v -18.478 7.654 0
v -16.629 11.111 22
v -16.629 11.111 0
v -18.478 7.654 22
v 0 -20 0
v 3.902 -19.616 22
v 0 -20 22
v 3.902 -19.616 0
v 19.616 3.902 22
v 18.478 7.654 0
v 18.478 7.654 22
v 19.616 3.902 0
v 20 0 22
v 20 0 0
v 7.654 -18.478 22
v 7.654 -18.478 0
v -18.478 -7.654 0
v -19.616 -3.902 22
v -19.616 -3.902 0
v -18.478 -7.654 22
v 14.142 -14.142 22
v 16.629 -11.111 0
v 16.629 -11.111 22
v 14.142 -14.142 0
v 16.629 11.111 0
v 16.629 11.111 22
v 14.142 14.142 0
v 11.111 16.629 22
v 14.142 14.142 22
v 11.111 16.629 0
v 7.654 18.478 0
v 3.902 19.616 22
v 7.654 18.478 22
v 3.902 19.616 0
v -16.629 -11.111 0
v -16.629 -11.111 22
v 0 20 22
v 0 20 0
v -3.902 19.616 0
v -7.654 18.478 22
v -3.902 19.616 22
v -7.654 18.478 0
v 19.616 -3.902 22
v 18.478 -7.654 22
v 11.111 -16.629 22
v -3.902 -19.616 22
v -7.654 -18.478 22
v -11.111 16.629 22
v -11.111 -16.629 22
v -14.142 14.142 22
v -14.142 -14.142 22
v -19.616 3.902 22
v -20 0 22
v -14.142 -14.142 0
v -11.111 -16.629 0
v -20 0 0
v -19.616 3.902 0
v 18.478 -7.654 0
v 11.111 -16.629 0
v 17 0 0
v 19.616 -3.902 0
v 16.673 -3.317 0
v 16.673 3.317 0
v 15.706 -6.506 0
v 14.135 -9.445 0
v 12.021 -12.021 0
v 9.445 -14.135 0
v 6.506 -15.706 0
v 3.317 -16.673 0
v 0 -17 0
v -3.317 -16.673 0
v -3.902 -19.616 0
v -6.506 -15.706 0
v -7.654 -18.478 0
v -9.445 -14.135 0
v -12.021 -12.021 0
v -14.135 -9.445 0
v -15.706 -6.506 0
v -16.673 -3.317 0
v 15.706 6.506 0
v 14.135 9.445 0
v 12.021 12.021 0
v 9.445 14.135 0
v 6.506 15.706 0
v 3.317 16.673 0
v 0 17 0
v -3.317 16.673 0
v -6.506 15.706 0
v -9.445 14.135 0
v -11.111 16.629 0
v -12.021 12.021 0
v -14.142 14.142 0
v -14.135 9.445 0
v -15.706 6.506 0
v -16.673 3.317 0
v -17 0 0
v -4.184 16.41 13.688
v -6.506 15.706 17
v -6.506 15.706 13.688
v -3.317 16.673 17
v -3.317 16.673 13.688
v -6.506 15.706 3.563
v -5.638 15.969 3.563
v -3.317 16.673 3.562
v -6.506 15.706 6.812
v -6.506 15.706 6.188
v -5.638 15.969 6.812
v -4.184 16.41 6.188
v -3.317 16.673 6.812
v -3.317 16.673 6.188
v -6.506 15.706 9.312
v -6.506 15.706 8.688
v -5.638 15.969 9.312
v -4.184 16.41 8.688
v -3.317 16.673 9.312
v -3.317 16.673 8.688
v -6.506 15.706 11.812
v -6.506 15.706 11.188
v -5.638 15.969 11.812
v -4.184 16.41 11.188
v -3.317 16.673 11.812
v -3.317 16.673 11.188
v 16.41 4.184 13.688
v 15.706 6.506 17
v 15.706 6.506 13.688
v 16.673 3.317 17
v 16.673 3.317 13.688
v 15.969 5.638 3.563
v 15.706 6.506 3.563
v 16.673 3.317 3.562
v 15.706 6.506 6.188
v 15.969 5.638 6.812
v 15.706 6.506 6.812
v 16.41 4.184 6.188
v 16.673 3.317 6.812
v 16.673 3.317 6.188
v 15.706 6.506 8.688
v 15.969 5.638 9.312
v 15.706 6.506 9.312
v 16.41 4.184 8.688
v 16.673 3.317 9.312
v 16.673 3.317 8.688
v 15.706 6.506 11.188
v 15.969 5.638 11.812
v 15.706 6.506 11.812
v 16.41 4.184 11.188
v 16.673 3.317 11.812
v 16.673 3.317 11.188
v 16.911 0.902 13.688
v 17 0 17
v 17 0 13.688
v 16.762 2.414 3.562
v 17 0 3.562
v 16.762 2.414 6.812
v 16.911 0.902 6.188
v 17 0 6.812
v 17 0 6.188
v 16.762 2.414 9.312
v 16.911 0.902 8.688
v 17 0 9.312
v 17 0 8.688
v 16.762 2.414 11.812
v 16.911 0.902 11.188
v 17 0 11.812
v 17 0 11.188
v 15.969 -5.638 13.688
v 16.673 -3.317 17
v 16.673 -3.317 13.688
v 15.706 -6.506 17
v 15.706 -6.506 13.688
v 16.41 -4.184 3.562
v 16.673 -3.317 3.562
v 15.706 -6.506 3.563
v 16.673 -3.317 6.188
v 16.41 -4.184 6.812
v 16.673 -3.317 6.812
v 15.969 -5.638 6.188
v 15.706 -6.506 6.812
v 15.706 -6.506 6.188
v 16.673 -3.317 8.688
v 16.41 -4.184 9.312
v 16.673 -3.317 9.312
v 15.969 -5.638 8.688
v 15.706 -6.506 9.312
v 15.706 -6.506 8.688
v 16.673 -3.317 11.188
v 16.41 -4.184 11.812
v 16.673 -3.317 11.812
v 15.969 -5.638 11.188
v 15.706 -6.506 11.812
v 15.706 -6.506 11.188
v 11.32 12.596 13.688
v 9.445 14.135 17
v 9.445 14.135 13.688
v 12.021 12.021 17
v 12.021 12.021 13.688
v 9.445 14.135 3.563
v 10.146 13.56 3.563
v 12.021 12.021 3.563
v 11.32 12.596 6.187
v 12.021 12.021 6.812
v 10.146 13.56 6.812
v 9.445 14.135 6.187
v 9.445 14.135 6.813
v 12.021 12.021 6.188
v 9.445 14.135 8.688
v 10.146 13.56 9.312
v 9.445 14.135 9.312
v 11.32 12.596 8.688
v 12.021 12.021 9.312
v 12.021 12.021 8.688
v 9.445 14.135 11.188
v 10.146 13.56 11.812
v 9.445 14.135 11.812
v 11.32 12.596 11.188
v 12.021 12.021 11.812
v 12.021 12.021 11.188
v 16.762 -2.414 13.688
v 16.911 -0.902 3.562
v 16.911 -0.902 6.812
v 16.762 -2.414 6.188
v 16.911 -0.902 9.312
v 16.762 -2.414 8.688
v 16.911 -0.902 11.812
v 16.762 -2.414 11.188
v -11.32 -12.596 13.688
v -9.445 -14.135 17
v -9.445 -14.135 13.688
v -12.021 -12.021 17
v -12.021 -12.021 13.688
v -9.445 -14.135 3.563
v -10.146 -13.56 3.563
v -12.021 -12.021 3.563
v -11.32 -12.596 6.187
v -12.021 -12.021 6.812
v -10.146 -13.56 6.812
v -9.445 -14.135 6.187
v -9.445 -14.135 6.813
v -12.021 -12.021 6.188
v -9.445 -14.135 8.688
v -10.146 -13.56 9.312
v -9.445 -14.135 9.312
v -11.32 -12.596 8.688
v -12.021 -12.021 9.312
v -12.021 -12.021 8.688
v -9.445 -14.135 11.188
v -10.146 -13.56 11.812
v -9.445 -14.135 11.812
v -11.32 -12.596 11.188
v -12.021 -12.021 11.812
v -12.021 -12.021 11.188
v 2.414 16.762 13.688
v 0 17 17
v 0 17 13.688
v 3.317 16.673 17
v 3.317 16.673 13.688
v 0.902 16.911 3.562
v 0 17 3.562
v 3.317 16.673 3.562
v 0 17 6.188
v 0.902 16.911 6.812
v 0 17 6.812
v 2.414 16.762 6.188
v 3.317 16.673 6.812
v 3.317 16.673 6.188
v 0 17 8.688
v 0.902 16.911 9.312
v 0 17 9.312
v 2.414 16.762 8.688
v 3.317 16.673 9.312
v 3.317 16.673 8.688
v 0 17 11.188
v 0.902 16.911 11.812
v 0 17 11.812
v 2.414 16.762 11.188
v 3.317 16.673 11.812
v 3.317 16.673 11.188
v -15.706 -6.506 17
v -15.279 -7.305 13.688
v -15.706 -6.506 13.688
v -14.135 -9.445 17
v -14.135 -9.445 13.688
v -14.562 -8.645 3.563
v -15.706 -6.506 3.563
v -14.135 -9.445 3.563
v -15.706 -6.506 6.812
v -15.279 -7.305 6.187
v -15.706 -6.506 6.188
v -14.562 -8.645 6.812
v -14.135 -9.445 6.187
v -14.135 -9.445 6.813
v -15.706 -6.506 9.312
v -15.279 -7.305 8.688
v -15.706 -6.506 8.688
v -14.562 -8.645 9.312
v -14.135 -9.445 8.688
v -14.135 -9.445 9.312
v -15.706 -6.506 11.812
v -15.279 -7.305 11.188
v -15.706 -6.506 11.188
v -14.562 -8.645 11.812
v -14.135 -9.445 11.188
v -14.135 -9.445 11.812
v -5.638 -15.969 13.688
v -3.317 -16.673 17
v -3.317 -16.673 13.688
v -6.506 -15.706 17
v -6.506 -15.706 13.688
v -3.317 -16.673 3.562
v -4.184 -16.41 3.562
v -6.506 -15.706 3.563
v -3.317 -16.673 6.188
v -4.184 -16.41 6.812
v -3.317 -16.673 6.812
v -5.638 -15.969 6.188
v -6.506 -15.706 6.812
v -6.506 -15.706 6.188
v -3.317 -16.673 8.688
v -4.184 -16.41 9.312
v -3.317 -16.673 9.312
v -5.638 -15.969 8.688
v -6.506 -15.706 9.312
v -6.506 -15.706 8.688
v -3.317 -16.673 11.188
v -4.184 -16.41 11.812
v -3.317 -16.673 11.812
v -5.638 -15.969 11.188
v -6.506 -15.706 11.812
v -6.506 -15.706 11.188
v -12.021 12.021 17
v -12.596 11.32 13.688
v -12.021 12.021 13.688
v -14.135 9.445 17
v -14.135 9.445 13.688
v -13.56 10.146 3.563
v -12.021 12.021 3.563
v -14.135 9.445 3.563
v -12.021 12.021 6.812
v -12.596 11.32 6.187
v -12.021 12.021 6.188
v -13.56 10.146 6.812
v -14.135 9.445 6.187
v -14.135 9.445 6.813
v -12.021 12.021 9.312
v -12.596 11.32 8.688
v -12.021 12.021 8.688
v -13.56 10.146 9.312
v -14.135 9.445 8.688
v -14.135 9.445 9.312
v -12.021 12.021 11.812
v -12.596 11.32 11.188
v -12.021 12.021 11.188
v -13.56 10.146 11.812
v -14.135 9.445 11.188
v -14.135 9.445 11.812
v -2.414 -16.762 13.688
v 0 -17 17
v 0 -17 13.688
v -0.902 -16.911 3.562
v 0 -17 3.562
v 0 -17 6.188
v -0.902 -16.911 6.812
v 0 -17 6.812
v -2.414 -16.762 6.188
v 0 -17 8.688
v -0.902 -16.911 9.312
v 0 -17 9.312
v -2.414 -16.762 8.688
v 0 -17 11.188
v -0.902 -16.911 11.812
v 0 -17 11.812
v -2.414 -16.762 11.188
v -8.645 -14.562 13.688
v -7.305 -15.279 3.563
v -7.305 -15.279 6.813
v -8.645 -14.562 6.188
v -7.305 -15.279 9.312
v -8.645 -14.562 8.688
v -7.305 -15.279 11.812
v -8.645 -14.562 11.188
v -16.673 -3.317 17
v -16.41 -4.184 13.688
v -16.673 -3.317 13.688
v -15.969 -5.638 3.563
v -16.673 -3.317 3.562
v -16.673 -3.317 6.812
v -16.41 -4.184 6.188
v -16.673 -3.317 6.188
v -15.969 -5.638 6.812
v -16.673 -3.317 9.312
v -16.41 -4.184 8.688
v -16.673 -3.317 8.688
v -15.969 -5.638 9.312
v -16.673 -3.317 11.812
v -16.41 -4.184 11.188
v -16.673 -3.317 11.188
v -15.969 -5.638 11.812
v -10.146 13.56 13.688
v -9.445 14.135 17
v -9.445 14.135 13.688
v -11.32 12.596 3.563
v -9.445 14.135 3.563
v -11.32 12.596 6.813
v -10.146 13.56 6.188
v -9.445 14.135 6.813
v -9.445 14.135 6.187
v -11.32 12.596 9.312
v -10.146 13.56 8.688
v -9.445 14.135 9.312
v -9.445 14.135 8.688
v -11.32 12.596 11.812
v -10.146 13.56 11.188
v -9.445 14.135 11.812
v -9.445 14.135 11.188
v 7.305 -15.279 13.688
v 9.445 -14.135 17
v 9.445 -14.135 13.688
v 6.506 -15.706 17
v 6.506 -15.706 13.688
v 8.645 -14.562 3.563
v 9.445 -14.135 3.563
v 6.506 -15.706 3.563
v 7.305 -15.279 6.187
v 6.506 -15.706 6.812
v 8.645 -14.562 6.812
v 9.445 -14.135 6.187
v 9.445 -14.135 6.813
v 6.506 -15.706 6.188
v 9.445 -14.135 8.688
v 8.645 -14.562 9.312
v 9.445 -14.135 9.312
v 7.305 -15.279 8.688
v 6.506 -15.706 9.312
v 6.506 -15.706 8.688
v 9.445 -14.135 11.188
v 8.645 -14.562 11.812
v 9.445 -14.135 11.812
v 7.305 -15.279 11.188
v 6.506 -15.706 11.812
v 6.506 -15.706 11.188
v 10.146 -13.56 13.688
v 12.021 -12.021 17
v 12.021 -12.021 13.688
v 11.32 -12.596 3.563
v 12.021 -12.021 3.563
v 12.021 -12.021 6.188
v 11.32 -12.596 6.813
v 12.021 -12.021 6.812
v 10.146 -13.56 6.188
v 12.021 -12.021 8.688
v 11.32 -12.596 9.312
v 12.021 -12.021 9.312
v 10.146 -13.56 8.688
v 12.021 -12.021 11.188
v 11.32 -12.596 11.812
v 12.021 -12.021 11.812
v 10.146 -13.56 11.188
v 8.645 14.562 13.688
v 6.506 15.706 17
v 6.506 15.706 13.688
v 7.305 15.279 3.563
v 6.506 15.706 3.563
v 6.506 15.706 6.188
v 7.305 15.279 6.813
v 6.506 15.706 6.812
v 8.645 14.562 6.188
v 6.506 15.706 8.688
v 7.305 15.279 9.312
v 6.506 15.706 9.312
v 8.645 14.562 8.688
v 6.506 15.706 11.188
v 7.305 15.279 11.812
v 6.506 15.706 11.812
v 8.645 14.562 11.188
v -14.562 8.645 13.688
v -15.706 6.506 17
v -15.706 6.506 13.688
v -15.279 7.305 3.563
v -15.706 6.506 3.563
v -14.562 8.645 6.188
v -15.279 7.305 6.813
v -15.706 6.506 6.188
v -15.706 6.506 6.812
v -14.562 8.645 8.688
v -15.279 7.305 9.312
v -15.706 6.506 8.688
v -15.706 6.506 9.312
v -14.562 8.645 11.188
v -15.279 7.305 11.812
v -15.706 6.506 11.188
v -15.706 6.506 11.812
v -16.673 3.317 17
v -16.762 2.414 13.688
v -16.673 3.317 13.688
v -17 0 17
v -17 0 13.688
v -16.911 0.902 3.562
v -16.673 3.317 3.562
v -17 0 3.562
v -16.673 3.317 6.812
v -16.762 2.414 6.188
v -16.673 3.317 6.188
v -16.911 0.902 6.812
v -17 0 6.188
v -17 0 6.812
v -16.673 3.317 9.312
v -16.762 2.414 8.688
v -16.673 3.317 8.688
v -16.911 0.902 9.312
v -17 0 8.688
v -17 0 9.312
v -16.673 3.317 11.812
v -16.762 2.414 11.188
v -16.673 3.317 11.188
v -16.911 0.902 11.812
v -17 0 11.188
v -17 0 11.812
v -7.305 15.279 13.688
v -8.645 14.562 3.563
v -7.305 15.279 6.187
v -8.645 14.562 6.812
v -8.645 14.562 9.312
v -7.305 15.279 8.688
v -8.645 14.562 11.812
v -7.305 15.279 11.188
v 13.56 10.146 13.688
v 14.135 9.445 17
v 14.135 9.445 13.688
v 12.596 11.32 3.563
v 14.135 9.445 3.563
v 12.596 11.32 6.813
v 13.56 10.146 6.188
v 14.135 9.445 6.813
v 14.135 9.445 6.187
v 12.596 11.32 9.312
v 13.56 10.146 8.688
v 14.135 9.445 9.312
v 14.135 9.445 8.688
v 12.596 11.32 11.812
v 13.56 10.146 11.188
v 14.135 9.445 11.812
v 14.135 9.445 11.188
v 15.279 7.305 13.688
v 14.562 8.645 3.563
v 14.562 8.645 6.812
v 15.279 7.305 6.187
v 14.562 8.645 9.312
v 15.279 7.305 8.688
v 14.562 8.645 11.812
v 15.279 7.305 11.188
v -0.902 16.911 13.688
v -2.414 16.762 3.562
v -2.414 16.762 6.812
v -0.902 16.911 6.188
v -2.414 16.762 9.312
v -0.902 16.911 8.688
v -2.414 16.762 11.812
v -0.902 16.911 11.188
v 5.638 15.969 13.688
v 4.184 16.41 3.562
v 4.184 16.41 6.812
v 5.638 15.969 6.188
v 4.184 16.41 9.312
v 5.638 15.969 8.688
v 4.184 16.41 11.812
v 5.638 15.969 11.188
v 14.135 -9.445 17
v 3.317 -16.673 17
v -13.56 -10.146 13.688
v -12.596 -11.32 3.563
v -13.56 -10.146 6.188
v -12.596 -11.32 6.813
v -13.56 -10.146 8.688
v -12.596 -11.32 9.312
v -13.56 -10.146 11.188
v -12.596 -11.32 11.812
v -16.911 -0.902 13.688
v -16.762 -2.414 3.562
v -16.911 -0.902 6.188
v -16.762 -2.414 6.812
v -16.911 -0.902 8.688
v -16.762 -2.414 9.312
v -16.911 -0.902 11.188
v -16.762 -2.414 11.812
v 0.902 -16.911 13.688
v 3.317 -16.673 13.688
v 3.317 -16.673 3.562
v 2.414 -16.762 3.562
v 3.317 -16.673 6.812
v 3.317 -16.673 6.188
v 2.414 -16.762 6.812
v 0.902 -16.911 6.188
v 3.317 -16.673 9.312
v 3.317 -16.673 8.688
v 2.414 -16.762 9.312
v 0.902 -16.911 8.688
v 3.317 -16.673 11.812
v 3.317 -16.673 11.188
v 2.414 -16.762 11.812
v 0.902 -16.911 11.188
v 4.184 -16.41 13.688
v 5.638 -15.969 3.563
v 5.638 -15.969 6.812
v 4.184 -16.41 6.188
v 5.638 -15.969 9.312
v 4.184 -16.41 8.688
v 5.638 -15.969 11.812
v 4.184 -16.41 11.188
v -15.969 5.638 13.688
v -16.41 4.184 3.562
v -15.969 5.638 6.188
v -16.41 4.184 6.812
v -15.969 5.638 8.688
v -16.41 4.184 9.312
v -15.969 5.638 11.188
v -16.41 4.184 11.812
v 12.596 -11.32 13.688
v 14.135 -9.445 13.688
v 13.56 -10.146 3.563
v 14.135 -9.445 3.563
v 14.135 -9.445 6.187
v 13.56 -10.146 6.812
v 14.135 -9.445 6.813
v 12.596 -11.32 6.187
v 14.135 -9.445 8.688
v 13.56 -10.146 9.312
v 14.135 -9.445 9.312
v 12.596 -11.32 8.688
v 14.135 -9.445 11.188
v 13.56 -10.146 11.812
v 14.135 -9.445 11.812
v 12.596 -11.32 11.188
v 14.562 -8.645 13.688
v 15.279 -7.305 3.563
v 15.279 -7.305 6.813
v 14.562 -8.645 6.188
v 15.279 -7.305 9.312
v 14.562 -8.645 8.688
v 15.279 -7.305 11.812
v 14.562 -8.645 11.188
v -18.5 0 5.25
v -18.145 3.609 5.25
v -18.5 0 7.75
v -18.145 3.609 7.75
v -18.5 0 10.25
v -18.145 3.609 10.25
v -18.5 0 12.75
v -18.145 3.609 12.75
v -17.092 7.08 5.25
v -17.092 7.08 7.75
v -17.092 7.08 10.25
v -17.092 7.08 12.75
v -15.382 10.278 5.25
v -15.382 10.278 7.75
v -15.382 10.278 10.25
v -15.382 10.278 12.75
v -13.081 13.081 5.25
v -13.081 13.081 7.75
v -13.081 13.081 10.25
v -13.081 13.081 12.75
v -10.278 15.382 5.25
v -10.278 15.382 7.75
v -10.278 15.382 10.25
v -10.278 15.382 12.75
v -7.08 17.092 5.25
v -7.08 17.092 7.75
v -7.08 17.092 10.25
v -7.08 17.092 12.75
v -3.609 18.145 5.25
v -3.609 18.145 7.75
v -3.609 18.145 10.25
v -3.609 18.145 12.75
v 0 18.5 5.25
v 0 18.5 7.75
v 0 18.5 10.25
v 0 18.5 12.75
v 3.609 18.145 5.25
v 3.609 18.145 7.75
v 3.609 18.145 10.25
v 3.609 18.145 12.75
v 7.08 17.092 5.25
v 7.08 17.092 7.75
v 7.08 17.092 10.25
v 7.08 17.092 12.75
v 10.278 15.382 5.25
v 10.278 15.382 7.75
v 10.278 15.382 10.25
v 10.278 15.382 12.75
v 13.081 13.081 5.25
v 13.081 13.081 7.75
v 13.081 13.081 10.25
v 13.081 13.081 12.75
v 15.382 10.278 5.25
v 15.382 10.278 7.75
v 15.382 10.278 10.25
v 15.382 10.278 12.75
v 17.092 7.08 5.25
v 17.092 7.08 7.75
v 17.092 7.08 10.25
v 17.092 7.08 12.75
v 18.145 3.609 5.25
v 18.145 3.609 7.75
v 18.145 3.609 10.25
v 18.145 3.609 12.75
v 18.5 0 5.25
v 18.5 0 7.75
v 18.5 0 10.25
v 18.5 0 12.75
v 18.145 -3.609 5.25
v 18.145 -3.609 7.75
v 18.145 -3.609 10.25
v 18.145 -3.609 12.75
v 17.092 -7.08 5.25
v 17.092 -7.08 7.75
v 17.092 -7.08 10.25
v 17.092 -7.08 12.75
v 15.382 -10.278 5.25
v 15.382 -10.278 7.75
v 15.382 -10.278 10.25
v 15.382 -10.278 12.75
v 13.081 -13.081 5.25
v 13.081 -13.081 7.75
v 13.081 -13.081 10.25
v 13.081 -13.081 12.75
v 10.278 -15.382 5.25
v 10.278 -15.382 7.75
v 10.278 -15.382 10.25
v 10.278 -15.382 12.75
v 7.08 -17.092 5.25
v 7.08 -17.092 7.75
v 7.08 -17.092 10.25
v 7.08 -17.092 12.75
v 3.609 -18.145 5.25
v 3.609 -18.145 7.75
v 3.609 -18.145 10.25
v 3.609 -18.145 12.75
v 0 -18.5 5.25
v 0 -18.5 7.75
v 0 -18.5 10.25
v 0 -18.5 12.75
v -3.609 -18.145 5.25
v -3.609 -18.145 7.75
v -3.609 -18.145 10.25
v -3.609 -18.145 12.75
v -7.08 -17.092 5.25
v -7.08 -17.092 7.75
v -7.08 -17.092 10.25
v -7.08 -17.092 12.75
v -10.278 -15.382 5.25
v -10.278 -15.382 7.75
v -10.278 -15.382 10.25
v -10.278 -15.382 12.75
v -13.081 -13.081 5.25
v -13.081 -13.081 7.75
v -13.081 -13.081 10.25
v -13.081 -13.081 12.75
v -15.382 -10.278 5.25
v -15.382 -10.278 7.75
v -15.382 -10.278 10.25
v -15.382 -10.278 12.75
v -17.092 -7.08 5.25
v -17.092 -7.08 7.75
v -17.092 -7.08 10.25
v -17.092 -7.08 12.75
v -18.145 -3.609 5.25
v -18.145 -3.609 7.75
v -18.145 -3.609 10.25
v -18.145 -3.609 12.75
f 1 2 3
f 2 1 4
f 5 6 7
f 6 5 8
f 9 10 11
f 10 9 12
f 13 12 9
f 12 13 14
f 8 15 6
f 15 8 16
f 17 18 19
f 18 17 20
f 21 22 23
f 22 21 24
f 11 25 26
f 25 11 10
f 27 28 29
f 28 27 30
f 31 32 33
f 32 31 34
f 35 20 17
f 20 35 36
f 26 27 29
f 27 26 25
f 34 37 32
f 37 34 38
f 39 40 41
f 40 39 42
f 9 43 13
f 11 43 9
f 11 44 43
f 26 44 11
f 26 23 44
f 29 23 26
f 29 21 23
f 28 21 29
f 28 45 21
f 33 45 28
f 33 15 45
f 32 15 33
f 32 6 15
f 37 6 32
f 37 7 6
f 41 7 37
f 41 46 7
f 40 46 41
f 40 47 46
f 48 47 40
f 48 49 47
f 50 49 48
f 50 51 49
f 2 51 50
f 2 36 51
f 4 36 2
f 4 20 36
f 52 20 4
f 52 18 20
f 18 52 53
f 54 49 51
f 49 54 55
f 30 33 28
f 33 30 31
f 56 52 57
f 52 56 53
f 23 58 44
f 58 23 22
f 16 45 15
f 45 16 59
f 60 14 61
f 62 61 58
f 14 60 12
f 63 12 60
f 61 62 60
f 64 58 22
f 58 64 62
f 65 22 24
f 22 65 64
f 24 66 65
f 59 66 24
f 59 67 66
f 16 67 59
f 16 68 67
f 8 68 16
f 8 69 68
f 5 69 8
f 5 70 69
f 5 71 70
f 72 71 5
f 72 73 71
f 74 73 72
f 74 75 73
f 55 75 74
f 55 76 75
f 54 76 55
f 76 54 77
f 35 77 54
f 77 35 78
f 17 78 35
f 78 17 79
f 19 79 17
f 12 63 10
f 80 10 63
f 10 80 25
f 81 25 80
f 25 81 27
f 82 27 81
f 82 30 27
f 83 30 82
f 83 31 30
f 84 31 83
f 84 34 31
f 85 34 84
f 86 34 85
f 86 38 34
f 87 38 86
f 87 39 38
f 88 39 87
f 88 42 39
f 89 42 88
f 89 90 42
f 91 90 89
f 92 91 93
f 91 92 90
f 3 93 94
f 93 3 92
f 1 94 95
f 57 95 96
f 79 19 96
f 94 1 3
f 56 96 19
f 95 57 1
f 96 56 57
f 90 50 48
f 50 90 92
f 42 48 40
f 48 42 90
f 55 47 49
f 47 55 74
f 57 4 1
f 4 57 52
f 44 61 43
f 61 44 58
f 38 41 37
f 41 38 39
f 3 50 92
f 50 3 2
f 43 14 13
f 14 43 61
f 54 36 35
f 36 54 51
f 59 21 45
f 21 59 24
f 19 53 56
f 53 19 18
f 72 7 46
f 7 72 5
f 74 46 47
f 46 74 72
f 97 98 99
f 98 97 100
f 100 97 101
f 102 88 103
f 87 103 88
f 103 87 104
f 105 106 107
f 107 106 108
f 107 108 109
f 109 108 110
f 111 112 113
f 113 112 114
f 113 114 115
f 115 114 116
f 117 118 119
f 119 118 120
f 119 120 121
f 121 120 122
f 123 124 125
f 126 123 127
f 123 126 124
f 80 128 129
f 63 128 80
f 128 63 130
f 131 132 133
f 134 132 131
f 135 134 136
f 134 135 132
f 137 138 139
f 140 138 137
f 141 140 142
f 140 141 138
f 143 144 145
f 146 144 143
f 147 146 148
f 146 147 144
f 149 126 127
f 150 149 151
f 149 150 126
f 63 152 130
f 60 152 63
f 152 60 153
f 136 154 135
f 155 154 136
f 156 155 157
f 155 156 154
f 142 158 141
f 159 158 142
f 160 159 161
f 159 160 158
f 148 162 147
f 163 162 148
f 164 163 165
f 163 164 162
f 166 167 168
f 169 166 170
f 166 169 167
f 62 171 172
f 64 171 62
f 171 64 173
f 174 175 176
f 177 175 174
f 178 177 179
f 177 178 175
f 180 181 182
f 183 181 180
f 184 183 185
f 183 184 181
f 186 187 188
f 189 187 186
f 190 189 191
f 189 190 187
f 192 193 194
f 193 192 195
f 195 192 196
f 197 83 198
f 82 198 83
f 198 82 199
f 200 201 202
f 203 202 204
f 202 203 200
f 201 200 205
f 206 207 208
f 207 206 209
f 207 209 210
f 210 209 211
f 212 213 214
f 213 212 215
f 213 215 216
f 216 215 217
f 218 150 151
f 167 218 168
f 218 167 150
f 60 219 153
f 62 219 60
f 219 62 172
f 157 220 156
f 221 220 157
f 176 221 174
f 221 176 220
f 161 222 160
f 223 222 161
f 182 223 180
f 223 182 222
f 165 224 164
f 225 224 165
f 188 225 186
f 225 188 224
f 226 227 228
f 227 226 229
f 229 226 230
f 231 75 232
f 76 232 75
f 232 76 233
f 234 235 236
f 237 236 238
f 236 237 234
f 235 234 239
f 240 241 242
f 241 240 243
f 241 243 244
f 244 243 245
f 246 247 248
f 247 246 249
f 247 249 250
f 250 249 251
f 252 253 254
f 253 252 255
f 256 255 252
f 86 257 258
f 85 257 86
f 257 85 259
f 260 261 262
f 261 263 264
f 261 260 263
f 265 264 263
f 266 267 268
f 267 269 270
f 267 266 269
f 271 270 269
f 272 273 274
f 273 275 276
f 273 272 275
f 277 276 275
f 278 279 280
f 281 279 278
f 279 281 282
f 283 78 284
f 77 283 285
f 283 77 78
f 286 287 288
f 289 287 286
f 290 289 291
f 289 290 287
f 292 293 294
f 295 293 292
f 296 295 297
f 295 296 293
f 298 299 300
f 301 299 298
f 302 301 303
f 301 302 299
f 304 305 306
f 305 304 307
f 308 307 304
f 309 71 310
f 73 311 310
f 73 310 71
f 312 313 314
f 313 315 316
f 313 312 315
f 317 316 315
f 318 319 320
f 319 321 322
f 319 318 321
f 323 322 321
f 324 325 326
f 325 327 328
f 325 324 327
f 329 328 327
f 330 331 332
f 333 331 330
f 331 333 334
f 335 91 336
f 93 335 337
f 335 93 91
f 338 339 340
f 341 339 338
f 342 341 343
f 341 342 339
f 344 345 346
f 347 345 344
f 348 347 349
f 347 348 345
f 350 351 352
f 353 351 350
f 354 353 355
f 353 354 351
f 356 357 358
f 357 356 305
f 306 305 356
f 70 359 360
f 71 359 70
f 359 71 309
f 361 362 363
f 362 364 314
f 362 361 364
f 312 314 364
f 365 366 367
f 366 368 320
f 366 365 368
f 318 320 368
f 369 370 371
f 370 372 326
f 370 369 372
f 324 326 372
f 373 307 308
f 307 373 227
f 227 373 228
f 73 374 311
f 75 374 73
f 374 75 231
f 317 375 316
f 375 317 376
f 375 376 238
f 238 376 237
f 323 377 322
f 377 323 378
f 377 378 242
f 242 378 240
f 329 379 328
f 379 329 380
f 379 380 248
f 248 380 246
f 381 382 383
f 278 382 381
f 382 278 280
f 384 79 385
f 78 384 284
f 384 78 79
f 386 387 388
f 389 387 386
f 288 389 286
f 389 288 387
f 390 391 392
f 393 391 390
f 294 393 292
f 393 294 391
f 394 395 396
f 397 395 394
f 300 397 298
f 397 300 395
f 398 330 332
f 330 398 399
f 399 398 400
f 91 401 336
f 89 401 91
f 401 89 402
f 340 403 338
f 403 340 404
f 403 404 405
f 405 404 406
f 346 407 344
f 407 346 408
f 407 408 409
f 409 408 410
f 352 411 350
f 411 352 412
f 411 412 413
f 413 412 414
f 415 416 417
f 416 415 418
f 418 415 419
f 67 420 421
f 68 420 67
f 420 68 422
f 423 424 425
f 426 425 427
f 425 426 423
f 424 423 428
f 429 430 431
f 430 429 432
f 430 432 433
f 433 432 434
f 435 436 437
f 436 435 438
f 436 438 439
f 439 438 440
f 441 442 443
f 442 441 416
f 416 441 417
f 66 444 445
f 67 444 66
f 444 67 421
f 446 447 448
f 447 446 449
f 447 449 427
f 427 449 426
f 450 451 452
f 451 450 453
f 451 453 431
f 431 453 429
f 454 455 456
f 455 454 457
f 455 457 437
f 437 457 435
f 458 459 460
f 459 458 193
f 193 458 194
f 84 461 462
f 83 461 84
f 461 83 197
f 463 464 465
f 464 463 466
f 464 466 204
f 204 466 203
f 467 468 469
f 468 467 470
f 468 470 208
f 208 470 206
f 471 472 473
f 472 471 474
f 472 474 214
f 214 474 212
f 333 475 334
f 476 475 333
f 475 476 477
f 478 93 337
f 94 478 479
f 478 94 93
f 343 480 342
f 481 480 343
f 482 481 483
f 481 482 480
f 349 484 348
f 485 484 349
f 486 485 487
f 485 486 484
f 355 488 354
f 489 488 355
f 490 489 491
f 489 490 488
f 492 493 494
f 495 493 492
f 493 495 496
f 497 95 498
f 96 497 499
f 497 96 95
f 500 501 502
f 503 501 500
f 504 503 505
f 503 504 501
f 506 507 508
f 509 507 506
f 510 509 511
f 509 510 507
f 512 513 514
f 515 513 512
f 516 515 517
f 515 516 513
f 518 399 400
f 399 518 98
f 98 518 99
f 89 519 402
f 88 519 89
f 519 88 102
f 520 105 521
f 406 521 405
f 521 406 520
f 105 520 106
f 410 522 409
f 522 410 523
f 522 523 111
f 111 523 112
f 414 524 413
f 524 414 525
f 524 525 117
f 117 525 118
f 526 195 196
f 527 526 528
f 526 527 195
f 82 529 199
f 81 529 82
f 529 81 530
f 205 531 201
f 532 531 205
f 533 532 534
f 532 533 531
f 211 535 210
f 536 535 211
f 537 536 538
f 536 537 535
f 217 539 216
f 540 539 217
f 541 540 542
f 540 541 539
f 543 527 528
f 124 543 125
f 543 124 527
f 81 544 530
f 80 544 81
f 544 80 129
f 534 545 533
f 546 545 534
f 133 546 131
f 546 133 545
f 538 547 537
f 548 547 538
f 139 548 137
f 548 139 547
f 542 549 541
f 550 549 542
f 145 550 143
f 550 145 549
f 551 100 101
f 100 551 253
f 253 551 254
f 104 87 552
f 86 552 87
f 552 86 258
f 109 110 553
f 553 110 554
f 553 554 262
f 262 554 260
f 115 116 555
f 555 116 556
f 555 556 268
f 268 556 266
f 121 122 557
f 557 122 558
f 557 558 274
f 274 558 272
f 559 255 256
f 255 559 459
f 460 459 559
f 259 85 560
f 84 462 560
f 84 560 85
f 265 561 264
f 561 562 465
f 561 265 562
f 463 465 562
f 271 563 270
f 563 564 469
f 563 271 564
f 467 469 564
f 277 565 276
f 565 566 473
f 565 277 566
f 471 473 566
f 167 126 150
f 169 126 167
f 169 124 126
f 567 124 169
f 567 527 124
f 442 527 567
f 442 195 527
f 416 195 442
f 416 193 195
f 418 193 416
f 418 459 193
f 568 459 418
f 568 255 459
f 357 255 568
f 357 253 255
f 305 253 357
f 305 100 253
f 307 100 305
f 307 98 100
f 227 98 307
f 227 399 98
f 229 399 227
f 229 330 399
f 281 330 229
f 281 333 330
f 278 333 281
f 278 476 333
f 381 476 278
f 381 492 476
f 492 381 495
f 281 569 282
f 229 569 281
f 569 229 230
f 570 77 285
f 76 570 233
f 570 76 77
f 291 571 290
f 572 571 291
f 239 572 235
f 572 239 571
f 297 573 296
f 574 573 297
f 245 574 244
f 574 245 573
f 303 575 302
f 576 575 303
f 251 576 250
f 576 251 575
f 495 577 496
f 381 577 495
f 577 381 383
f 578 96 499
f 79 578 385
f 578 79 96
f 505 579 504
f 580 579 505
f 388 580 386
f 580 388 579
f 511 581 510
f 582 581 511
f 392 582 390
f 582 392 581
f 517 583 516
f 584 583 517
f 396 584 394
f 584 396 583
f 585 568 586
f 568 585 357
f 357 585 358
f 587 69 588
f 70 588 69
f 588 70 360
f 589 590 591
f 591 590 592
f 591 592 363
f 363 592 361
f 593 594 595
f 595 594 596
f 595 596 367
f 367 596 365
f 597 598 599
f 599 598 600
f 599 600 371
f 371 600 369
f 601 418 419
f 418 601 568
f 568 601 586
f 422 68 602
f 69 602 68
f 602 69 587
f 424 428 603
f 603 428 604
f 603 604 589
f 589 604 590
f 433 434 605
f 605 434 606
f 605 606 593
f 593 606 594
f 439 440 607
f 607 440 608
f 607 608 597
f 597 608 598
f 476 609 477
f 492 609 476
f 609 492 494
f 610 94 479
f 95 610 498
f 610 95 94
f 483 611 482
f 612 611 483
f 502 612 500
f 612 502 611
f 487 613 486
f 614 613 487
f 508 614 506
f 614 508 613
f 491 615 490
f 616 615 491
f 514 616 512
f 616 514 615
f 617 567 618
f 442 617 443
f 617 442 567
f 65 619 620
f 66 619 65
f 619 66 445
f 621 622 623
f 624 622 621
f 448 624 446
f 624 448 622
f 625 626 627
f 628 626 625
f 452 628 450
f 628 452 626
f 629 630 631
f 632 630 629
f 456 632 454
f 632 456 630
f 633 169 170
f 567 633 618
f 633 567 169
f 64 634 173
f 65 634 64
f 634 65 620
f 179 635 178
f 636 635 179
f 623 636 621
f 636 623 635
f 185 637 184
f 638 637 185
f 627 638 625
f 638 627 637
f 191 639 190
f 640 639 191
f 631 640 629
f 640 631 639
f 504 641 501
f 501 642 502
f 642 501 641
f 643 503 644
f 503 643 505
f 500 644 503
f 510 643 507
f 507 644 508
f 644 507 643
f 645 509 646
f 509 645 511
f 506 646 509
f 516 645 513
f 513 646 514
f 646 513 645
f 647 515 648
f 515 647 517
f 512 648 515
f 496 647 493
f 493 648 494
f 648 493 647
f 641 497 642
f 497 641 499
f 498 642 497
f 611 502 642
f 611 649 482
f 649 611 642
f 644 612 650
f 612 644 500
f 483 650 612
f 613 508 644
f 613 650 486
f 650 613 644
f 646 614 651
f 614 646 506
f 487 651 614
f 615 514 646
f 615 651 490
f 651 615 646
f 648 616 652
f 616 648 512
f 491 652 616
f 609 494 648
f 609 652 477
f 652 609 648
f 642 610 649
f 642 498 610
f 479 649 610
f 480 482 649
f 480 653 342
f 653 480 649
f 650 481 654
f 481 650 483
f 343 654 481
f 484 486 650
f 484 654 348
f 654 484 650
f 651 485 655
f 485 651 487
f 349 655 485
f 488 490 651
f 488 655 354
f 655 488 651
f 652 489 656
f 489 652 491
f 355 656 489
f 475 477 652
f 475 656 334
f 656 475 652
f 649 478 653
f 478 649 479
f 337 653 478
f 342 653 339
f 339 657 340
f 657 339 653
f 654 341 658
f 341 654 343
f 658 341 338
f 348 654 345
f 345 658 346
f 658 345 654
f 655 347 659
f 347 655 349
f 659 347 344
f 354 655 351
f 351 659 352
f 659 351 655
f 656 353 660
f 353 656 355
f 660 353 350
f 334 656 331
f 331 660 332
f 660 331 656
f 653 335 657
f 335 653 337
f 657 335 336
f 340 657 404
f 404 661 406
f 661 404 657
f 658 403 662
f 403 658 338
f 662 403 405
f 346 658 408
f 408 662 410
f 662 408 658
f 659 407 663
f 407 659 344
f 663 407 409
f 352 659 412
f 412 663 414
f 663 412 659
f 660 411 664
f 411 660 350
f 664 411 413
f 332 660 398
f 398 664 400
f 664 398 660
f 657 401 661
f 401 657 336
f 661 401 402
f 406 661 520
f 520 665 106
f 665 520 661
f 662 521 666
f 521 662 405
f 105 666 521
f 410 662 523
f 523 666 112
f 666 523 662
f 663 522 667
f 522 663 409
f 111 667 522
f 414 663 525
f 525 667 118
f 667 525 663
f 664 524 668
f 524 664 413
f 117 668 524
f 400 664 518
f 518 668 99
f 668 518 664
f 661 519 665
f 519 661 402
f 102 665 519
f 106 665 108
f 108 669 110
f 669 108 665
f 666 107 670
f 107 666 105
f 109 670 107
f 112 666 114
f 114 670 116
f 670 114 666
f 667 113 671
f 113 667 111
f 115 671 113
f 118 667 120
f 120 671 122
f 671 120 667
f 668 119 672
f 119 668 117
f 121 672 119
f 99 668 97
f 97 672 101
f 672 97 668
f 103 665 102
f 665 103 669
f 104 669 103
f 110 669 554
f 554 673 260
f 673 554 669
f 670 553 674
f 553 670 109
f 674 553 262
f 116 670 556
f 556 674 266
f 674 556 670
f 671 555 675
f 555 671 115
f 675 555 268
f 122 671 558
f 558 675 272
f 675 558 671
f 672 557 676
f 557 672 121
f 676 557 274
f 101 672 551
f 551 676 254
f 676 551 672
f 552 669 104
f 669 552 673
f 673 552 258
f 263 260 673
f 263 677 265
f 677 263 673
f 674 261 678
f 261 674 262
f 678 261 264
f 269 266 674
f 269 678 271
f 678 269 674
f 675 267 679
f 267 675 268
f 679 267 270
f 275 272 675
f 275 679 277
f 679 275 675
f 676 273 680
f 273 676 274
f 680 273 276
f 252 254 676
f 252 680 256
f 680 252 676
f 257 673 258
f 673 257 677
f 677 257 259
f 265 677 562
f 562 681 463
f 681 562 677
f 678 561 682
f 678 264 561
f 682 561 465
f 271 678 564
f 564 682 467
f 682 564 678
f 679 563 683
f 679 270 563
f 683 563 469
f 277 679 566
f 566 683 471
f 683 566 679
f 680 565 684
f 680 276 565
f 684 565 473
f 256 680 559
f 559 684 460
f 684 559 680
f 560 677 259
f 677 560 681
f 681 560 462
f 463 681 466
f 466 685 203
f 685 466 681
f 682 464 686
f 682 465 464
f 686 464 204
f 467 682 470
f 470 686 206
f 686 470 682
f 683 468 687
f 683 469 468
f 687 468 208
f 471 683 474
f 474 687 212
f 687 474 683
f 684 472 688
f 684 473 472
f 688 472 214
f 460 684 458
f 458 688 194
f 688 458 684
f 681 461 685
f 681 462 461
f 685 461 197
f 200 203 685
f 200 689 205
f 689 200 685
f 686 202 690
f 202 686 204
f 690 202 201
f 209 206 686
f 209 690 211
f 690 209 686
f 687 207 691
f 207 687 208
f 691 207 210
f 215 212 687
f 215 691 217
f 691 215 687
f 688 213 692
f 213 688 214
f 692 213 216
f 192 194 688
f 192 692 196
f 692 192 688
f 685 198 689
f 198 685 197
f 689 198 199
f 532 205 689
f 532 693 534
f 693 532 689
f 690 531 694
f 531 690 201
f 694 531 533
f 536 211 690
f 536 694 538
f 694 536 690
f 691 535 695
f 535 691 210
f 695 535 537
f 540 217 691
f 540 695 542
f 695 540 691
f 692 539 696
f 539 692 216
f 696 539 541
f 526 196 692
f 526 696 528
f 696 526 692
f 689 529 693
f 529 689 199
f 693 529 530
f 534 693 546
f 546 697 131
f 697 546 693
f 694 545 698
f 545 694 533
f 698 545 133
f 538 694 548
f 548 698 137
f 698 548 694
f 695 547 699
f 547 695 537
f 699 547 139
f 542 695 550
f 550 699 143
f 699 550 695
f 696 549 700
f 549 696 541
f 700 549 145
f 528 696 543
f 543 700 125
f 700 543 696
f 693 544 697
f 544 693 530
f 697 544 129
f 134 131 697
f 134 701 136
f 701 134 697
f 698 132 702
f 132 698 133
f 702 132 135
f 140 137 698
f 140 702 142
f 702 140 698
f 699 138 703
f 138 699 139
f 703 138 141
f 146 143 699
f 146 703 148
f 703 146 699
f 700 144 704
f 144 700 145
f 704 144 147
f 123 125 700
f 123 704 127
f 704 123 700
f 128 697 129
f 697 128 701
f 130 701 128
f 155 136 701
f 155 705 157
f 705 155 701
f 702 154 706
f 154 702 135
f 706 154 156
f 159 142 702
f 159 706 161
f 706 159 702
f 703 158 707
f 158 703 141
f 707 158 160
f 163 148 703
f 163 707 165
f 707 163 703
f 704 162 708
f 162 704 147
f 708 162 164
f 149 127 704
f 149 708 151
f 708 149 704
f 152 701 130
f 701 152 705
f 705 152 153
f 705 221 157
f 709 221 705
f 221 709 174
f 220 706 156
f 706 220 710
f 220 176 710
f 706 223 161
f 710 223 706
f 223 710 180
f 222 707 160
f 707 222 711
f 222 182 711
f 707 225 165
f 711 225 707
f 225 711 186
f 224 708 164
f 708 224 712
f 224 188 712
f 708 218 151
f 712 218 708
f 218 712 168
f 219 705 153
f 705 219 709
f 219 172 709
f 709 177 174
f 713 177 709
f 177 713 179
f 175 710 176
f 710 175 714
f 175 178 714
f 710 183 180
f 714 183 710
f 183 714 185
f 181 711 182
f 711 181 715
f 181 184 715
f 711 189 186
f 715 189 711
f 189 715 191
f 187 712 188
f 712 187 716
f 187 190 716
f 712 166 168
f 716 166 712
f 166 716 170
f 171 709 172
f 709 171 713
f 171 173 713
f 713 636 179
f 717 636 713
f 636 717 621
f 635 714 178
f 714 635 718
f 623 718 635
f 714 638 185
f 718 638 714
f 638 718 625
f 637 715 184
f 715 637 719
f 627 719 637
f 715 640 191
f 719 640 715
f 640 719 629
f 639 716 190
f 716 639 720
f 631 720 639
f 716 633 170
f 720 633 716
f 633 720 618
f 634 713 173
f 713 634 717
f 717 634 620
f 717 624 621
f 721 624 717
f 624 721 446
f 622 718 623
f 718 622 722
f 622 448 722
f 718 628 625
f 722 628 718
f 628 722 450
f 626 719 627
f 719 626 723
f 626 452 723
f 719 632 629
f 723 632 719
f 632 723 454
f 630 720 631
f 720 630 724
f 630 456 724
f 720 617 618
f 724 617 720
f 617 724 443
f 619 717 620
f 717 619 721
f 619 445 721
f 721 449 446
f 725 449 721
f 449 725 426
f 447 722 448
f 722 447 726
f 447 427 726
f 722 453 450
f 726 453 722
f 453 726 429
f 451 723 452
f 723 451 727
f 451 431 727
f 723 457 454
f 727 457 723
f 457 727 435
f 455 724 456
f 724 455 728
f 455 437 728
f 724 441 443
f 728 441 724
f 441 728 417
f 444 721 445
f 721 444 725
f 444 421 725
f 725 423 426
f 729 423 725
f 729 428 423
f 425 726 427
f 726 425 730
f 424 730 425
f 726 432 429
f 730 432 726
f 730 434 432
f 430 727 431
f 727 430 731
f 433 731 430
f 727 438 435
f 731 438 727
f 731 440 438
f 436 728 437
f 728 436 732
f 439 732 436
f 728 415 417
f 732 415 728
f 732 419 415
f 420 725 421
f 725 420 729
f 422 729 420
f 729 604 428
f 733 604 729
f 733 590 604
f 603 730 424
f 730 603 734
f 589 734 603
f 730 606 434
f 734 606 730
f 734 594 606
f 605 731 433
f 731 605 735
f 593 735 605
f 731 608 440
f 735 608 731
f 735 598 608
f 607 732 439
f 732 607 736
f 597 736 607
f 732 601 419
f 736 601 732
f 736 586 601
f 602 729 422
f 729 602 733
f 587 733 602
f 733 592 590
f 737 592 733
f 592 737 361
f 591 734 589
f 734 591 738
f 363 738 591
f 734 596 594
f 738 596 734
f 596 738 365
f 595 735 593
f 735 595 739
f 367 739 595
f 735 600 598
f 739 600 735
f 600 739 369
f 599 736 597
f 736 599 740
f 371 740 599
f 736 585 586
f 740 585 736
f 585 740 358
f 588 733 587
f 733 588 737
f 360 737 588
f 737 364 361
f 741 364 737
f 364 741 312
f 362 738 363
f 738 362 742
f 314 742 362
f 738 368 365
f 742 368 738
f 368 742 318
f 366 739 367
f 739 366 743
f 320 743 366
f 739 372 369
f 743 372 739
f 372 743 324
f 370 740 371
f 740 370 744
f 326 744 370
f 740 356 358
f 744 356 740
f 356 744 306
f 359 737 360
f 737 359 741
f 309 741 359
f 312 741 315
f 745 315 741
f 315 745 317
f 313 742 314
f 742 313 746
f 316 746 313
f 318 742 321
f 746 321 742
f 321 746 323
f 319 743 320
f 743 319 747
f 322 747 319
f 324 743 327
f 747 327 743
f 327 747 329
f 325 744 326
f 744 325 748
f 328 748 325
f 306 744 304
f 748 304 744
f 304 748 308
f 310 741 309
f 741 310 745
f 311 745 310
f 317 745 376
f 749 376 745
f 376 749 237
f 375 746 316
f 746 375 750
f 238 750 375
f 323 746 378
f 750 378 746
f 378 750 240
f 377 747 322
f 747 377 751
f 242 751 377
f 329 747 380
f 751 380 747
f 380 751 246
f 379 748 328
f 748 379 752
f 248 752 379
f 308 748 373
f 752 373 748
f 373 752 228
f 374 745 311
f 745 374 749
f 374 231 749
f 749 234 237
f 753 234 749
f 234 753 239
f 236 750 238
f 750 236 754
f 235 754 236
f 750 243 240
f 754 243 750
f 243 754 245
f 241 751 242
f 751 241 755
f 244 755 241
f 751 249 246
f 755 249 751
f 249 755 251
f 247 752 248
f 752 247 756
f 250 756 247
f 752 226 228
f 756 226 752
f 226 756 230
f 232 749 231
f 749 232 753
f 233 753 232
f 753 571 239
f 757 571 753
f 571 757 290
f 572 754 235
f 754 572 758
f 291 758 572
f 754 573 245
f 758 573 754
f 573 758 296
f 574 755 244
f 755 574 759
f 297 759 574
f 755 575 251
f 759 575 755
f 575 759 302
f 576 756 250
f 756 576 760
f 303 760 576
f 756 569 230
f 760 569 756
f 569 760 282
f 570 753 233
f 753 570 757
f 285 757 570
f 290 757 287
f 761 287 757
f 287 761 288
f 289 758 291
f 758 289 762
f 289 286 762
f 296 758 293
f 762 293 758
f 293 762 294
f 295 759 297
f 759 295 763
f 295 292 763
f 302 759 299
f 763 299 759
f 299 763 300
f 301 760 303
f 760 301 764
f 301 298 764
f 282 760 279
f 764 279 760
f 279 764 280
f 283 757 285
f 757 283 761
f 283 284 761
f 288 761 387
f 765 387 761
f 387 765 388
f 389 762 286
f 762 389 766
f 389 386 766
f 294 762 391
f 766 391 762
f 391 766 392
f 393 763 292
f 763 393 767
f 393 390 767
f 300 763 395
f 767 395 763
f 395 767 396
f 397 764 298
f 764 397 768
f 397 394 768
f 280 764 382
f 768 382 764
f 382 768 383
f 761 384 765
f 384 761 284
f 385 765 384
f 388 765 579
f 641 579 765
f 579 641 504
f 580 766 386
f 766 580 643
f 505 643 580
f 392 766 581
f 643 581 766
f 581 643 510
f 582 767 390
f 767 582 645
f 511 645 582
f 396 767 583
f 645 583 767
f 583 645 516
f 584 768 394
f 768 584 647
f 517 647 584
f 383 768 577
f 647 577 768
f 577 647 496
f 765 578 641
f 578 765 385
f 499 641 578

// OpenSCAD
$fn = 32;

// ----------------------------------------------------------------------
// Threaded cap: 40 mm body, 22 mm tall, 34 mm threaded bore
// ----------------------------------------------------------------------

// --- parameters (mm) ---
outer_d = 40;             // cap outside diameter
body_h = 22;              // cap height
top_t = 5;                // closed top thickness
bore_d = 34;              // bore core diameter
pitch = 2.5;              // thread pitch
thread_d = 1.5;           // thread depth
thread_z = 3;             // thread start above the rim
thread_h = 11;            // threaded height

difference() {
  union() {
    cylinder(h = 22, d = outer_d);
  }
  /* threaded bore, closed at the top */
  translate([0, 0, -2.5]) cylinder(h = 19.5, d = bore_d);
  translate([0, 0, 3]) rotate_extrude() polygon([[16, 0], [16, 11], [16.5, 11], [18.5, 9.75], [16.5, 8.5], [18.5, 7.25], [16.5, 6], [18.5, 4.75], [16.5, 3.5], [18.5, 2.25], [16.5, 0], [16, 0]]);
}
